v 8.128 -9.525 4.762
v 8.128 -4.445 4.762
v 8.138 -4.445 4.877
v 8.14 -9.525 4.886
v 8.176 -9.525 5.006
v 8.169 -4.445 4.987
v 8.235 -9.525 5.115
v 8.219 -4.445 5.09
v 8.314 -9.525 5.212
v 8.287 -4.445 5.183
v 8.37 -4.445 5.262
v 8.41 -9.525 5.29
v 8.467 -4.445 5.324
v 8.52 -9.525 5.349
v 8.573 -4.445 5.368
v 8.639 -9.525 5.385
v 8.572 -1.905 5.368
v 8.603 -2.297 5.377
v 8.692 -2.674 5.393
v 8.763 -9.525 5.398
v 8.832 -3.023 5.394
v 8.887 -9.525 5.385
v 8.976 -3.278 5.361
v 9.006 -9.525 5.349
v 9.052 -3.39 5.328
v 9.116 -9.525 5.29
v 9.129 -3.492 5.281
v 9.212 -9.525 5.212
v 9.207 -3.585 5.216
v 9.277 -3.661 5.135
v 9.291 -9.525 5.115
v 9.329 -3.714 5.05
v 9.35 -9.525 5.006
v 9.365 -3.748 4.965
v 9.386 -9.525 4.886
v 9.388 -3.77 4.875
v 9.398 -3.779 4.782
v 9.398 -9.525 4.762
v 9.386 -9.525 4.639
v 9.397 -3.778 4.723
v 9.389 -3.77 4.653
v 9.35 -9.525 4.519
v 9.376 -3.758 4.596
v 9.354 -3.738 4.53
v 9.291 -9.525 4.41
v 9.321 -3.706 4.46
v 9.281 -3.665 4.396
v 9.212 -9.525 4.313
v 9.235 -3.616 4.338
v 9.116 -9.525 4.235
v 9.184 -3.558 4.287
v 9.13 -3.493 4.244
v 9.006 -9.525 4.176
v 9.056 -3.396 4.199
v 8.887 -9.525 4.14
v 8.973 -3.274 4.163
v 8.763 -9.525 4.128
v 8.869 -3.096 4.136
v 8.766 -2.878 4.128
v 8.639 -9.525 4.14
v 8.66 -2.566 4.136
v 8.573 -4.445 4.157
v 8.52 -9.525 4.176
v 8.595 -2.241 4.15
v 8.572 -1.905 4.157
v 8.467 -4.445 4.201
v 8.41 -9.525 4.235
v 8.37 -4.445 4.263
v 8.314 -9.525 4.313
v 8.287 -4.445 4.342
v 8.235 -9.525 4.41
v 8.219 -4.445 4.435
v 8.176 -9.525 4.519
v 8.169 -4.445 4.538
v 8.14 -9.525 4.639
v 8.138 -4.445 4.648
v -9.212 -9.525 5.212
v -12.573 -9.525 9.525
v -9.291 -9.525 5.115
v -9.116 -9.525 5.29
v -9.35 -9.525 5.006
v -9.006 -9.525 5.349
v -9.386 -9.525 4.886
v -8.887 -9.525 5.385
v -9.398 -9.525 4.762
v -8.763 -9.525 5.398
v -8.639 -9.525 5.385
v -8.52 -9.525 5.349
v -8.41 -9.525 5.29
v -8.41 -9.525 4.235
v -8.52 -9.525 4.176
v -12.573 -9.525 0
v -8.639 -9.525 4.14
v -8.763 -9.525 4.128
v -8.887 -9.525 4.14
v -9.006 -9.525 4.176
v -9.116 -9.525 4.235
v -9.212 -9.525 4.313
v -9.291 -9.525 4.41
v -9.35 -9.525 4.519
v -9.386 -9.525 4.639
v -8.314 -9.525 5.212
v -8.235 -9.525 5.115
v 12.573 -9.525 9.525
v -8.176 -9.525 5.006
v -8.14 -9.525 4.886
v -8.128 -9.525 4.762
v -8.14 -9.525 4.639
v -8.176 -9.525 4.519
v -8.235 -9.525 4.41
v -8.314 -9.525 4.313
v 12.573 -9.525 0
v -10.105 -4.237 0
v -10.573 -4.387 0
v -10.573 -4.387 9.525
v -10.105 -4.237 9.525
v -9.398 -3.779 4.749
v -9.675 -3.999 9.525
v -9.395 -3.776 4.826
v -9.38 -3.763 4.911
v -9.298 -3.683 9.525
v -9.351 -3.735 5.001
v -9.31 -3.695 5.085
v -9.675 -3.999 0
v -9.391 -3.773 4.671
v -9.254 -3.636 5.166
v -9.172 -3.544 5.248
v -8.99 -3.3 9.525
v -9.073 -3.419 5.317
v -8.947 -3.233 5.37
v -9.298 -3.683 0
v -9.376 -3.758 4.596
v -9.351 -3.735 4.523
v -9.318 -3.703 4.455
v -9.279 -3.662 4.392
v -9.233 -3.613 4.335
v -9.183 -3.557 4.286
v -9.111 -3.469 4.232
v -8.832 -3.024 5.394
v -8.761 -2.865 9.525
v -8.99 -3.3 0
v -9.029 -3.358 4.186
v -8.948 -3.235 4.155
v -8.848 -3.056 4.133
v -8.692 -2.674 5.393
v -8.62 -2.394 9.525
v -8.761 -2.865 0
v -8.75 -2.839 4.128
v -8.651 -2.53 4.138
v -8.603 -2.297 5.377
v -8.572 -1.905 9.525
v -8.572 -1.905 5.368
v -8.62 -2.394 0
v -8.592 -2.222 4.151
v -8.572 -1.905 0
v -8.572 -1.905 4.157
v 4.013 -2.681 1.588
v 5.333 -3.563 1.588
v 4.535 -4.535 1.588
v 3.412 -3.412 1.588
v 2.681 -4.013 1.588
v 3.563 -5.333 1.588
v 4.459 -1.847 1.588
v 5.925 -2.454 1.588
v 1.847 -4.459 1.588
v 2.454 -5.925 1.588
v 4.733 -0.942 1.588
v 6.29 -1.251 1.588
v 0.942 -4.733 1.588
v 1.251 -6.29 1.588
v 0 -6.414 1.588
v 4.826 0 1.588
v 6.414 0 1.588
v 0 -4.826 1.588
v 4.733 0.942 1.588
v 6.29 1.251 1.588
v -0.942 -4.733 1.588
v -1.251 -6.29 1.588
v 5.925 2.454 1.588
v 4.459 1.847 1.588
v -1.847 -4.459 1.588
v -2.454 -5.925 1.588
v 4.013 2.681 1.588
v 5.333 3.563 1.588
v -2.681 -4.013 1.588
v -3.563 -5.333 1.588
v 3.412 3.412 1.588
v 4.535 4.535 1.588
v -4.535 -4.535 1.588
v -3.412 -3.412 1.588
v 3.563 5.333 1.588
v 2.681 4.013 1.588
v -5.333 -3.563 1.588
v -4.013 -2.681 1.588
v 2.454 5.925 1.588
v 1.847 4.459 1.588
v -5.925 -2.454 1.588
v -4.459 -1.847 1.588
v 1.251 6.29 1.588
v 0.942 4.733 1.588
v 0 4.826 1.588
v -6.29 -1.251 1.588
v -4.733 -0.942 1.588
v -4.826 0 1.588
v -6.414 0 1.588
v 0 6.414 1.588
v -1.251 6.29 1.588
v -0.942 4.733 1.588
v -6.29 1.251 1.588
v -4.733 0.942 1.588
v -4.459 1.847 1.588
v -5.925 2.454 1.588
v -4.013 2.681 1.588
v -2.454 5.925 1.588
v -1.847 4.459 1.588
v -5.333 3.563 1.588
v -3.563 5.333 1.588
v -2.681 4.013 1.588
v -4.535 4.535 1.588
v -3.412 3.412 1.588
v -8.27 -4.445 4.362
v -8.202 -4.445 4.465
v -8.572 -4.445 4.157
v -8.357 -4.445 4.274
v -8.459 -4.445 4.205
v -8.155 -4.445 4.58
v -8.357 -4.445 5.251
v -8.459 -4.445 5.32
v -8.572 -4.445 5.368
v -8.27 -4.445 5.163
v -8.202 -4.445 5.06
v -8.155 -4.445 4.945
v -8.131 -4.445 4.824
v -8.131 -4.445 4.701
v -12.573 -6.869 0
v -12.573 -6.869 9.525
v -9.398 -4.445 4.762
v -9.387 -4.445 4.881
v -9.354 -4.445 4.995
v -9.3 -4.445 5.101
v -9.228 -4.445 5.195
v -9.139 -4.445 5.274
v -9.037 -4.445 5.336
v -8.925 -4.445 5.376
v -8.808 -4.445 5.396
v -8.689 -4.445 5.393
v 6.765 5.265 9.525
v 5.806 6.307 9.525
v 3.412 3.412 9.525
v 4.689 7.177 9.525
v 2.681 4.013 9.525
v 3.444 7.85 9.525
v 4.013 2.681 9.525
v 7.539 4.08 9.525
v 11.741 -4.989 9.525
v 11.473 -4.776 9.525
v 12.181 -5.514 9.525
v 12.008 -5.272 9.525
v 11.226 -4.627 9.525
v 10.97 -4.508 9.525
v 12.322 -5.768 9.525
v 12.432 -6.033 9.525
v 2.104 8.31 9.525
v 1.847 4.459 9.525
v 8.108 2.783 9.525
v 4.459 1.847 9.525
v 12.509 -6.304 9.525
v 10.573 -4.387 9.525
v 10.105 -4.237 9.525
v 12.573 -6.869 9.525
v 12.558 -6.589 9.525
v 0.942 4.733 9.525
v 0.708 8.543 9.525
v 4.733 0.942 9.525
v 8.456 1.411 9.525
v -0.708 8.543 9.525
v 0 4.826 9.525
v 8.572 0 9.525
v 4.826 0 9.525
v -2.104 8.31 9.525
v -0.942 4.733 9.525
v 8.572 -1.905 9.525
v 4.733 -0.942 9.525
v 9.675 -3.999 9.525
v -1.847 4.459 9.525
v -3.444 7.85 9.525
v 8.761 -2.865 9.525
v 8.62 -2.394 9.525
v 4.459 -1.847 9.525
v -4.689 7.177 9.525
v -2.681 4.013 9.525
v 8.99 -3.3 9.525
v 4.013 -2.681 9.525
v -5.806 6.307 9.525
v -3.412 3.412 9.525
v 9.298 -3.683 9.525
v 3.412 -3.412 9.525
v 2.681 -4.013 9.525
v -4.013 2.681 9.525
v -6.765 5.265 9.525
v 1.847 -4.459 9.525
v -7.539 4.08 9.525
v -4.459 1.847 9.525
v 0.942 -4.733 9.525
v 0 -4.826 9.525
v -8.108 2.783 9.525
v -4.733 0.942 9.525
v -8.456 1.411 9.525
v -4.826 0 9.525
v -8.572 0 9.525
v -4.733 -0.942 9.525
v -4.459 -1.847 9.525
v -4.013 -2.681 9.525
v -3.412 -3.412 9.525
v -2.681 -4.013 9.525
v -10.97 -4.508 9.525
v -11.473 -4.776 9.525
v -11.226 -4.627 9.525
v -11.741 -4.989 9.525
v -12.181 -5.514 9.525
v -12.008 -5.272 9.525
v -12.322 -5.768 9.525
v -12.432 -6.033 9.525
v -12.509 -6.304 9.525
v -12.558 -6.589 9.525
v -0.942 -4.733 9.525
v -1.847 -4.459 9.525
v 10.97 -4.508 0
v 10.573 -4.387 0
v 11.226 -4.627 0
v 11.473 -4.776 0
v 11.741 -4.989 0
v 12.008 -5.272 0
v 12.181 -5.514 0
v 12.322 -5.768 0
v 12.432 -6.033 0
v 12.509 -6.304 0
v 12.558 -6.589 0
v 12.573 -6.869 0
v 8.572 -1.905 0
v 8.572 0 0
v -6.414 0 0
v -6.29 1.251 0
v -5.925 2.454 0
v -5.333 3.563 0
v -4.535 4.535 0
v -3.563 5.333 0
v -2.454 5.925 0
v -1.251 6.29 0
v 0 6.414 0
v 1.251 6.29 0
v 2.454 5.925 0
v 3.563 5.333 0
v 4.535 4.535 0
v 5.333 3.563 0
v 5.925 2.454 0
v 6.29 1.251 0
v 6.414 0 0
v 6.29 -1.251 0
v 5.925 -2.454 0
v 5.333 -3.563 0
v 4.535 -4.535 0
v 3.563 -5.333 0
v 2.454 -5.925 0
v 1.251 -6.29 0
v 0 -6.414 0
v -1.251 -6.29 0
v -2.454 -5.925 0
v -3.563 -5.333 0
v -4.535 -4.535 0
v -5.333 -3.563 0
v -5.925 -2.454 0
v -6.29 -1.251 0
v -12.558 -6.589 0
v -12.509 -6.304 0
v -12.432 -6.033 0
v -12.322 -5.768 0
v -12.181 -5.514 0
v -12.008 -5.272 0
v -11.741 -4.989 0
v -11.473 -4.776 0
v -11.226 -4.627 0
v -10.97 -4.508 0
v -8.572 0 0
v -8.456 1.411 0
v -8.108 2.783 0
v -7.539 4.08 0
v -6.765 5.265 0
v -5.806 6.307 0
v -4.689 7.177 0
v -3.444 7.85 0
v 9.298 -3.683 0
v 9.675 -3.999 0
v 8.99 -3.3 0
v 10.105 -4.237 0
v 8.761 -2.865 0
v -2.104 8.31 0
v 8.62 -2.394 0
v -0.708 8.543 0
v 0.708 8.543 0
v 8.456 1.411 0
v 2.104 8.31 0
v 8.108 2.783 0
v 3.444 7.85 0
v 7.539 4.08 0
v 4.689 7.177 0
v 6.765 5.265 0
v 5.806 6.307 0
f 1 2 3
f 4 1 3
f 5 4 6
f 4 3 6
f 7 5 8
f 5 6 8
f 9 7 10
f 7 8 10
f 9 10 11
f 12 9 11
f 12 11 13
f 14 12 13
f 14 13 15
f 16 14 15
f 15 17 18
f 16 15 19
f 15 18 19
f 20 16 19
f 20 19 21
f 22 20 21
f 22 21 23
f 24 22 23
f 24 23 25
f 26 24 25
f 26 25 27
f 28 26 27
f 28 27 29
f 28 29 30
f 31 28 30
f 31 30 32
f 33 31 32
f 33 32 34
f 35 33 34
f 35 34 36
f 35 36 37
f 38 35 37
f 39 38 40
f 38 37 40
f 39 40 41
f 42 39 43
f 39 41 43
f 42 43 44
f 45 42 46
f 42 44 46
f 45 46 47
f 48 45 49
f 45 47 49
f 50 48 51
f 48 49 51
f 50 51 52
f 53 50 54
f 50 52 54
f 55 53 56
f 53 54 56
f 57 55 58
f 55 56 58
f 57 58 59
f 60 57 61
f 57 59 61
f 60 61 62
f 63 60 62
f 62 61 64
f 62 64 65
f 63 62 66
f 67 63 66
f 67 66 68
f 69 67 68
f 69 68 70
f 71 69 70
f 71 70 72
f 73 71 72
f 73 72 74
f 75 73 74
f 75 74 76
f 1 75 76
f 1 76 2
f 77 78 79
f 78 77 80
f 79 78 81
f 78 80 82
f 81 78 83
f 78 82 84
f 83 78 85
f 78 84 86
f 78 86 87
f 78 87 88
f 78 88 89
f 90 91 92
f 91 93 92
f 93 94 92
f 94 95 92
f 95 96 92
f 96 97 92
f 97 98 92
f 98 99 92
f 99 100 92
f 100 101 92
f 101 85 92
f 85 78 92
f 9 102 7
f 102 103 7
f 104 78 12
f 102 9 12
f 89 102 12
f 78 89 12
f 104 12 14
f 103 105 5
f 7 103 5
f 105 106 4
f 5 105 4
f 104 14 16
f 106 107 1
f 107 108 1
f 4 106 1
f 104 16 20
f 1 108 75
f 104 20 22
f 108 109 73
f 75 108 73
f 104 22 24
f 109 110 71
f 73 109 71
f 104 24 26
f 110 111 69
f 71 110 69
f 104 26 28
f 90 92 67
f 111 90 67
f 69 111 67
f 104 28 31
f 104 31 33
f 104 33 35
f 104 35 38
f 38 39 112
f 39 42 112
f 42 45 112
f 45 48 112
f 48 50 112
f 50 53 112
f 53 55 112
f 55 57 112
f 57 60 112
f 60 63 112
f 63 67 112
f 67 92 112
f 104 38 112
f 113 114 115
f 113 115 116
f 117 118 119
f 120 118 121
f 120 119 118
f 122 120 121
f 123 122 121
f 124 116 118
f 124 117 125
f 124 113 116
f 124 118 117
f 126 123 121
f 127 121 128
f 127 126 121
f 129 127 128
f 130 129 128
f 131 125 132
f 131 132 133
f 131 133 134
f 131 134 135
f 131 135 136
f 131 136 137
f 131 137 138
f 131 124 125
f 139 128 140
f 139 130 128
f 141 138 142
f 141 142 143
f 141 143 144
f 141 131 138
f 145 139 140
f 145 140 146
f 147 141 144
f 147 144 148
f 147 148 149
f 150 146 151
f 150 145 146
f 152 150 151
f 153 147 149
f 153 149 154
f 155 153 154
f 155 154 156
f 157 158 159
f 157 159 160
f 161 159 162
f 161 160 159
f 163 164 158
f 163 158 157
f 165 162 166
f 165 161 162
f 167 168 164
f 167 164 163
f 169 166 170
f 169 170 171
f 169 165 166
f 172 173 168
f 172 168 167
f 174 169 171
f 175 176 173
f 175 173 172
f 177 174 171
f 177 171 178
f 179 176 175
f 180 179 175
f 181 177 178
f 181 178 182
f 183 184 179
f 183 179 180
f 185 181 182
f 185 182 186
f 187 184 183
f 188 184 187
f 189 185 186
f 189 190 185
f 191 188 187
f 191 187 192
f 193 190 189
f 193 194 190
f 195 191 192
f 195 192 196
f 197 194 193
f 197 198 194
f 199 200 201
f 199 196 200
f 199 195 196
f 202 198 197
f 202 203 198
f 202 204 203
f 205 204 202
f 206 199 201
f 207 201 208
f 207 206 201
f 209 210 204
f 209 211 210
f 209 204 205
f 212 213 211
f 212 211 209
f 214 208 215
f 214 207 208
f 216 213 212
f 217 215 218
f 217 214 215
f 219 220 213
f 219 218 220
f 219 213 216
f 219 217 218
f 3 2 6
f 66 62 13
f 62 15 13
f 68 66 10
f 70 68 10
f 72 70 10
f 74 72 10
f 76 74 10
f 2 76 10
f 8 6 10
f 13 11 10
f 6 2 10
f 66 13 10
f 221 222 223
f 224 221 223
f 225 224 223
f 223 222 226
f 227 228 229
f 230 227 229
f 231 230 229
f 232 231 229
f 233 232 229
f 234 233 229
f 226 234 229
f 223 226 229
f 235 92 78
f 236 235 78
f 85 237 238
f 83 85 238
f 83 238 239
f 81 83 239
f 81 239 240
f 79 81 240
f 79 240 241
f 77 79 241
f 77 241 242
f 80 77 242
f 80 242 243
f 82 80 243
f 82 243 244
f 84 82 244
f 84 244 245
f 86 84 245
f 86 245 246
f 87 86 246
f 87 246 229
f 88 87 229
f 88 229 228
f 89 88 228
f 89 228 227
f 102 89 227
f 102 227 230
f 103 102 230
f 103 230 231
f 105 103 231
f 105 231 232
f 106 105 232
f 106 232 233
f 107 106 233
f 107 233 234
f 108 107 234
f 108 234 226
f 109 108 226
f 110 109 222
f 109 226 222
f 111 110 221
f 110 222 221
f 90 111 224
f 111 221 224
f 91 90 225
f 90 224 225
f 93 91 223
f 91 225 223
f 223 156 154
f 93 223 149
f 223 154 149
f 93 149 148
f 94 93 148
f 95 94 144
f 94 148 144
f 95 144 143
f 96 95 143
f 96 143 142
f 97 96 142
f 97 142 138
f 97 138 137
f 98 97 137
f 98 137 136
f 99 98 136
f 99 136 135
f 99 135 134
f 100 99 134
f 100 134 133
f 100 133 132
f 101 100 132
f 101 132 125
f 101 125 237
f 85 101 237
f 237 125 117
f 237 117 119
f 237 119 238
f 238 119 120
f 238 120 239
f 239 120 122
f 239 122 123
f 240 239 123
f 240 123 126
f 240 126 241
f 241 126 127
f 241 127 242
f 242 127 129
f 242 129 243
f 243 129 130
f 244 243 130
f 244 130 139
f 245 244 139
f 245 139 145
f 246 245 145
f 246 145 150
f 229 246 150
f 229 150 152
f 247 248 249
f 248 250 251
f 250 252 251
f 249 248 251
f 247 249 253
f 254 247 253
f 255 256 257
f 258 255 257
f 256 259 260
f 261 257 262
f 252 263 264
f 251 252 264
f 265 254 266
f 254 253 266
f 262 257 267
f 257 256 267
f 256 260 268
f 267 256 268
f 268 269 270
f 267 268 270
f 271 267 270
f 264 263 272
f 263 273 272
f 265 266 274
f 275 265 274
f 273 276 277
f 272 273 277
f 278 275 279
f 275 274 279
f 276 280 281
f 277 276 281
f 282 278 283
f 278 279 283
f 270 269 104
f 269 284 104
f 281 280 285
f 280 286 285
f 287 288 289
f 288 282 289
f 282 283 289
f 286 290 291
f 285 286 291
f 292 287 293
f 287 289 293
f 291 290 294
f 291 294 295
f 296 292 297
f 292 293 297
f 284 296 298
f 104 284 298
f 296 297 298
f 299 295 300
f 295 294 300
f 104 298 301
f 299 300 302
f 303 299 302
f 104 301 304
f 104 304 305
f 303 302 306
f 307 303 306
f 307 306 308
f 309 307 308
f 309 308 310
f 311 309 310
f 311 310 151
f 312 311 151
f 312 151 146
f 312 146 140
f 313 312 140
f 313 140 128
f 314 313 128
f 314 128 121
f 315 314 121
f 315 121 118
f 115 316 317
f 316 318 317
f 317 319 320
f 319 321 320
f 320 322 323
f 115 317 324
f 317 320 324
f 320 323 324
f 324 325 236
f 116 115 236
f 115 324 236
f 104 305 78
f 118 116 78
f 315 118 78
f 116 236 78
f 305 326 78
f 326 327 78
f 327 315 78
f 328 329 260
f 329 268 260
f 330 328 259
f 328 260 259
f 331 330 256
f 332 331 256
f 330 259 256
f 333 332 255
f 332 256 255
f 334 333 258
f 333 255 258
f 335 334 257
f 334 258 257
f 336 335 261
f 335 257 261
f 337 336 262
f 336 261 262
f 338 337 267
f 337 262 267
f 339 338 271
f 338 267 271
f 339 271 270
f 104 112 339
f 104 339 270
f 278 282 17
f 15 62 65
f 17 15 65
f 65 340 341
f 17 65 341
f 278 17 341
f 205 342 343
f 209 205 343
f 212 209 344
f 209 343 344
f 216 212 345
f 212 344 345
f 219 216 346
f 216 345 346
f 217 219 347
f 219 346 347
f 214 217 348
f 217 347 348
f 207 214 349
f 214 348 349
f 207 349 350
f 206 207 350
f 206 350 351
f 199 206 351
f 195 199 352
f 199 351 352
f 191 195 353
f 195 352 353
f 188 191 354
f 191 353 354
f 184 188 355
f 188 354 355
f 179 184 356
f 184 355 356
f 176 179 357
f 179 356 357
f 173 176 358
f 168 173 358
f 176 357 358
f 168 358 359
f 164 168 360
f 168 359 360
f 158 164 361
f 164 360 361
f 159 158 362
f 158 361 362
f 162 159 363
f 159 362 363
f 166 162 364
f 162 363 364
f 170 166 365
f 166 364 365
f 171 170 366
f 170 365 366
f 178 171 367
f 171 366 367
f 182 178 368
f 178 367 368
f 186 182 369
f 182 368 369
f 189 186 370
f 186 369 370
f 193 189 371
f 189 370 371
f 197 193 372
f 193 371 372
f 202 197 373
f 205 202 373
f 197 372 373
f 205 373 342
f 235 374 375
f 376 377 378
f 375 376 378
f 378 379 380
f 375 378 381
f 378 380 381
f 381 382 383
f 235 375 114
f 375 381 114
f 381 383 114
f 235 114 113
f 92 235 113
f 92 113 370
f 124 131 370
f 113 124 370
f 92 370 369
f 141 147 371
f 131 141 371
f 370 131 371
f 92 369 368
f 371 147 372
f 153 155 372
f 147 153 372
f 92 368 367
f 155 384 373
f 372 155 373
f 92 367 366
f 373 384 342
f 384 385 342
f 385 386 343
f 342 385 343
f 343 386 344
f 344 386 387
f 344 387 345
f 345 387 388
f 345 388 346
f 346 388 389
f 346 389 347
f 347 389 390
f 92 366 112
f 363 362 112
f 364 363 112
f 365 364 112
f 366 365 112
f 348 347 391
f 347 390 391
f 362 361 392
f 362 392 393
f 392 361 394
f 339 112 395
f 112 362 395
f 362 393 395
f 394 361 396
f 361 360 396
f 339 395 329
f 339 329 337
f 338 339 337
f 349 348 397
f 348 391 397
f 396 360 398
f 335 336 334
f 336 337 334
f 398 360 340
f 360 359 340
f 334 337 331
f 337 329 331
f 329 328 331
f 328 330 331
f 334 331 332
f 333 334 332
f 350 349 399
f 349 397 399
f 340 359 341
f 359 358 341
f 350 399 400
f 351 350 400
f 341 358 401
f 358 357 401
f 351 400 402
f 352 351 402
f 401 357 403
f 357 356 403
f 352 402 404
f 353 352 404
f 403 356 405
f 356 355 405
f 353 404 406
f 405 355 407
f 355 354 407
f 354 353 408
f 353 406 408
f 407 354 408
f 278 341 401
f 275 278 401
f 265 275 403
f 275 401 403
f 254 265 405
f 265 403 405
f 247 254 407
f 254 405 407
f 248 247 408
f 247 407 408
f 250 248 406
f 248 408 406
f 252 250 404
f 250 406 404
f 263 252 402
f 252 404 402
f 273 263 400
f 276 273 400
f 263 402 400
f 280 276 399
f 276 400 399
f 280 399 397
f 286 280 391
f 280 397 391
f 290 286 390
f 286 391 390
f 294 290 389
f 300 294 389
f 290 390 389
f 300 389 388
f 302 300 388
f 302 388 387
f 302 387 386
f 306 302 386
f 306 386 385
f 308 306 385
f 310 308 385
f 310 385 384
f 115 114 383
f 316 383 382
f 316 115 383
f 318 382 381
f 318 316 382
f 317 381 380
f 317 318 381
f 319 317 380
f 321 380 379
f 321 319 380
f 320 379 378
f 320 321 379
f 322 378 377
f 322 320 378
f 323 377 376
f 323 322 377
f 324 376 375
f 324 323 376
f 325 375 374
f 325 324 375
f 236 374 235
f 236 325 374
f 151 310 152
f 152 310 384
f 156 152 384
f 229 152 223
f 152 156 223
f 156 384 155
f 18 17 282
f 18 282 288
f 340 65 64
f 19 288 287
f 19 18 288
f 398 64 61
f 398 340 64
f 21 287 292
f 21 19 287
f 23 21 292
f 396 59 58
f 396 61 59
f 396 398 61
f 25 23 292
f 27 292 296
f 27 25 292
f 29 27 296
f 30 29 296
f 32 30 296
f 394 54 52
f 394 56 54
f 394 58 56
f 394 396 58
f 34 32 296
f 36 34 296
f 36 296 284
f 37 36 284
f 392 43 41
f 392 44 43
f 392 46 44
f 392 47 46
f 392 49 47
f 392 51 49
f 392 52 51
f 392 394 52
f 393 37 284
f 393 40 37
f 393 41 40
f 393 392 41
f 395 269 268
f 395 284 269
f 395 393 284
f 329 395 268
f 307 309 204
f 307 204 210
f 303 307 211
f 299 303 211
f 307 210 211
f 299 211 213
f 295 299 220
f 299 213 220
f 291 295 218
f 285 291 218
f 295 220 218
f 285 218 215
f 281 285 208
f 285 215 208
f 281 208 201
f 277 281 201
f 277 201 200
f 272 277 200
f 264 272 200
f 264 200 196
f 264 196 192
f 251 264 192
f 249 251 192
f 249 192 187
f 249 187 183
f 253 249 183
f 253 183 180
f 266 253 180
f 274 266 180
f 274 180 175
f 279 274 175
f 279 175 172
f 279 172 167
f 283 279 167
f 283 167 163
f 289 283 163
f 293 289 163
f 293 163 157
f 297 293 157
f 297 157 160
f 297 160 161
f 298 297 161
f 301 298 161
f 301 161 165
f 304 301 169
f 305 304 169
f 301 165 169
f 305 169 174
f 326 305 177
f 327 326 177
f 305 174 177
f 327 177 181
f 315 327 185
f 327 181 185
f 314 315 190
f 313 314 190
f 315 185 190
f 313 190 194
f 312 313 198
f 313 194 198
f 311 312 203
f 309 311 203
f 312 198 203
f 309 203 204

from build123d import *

# Parameters (mm, degrees)
BOSS_EXTRUDE1_DEPTH = 9.525
SKETCH11_R          = 6.4135
CUT_EXTRUDE7_DEPTH  = 1.5875
SKETCH12_R          = 4.826
CUT_EXTRUDE8_DEPTH  = 23.464106648
SKETCH13_R          = 0.635
CUT_EXTRUDE9_DEPTH  = 25.720183808
FILLET1_R           = 2.54
SKETCH15_W          = 8.472670481
SKETCH15_H          = 13.323689659
SKETCH15_W_2        = 7.661730679
CUT_EXTRUDE10_DEPTH = 28.733584143
FILLET2_R           = 2.54


with BuildPart() as part:
    # Sketch10 → Boss-Extrude1 (new body)
    with BuildSketch(Plane.XY):
        with BuildLine():
            Line((-8.5725, 0), (-8.5725, -4.445))
            Line((-8.5725, -4.445), (-18.7325, -4.445))
            Line((-18.7325, -4.445), (-18.7325, -9.525))
            Line((-18.7325, -9.525), (18.7325, -9.525))
            Line((18.7325, -9.525), (18.7325, -4.445))
            Line((18.7325, -4.445), (8.5725, -4.445))
            Line((8.5725, -4.445), (8.5725, 0))
            ThreePointArc((8.5725, 0), (0, 8.5725), (-8.5725, 0))
        make_face()
    extrude(amount=BOSS_EXTRUDE1_DEPTH)

    # Sketch11 → Cut-Extrude7 (cut)
    with BuildSketch(Plane(origin=(0, 0, 0), x_dir=(-1, 0, 0), z_dir=(0, 0, -1))):
        Circle(SKETCH11_R)
    extrude(amount=-CUT_EXTRUDE7_DEPTH, mode=Mode.SUBTRACT)

    # Sketch12 → Cut-Extrude8 (cut, through all)
    with BuildSketch(Plane(origin=(0, 0, 1.5875), x_dir=(-1, 0, 0), z_dir=(0, 0, -1))):
        Circle(SKETCH12_R)
    extrude(amount=-CUT_EXTRUDE8_DEPTH, mode=Mode.SUBTRACT)

    # Sketch13 → Cut-Extrude9 (cut, through all)
    with BuildSketch(Plane(origin=(0, -4.445, 0), x_dir=(1, 0, 0), z_dir=(0, 1, 0))):
        with Locations(Location((-8.763, -4.7625, 0), (0, 0, 180))):
            Circle(SKETCH13_R)
        with Locations(Location((8.763, -4.7625, 0), (0, 0, 180))):
            Circle(SKETCH13_R)
    extrude(amount=-CUT_EXTRUDE9_DEPTH, mode=Mode.SUBTRACT)

    # Fillet1
    # the kernel refuses this fillet: 2.54 mm, written as the material it adds along each edge
    with BuildSketch(Plane(origin=(8.5725, -4.445, 0), x_dir=(0, 1, 0), z_dir=(0, 0, 1))) as fillet1_piece_1_section:
        with BuildLine():
            CenterArc((FILLET1_R, -FILLET1_R), FILLET1_R, 90, 90)
            Line((0, -FILLET1_R), (0, 0))
            Line((0, 0), (FILLET1_R, 0))
        make_face()
    fillet1_piece_1 = extrude(amount=10.506748607, mode=Mode.PRIVATE)
    fillet1_piece_1 = split(fillet1_piece_1, bisect_by=Plane(origin=(8.63691398, -2.568331275, 9.525), z_dir=(0, 0, -1)), keep=Keep.TOP, mode=Mode.PRIVATE)
    fillet1_piece_1 = fillet1_piece_1 - Plane(origin=(8.763, -2.568331275, 4.7625), x_dir=(-1, 0, 0), z_dir=(0, 1, 0)) * Cylinder(0.635, 32, mode=Mode.PRIVATE)
    add(fillet1_piece_1)
    with BuildSketch(Plane(origin=(-8.5725, -4.445, -0.981748607), x_dir=(0, 1, 0), z_dir=(0, 0, 1))) as fillet1_piece_2_section:
        with BuildLine():
            CenterArc((FILLET1_R, FILLET1_R), FILLET1_R, 180, 90)
            Line((0, FILLET1_R), (0, 0))
            Line((0, 0), (FILLET1_R, 0))
        make_face()
    fillet1_piece_2 = extrude(amount=10.506748607, mode=Mode.PRIVATE)
    fillet1_piece_2 = split(fillet1_piece_2, bisect_by=Plane(origin=(-8.636913982, -2.568331274, 0), z_dir=(0, 0, 1)), keep=Keep.TOP, mode=Mode.PRIVATE)
    fillet1_piece_2 = fillet1_piece_2 - Plane(origin=(-8.763, -2.568331274, 4.7625), x_dir=(-1, 0, 0), z_dir=(0, 1, 0)) * Cylinder(0.635, 32, mode=Mode.PRIVATE)
    add(fillet1_piece_2)
    # the kernel refuses this fillet: 2.54 mm, written as the material it takes off along each edge
    with BuildSketch(Plane(origin=(18.7325, -4.445, -6.35), x_dir=(-1, 0, 0), z_dir=(0, 0, 1)), Plane(origin=(-18.7325, -4.445, -6.35), x_dir=(0, -1, 0), z_dir=(0, 0, 1))) as fillet1_2_piece_1:
        with BuildLine():
            CenterArc((FILLET1_R, FILLET1_R), FILLET1_R, 180, 90)
            Line((0, FILLET1_R), (0, 0))
            Line((0, 0), (FILLET1_R, 0))
        make_face()
    extrude(amount=22.225, mode=Mode.SUBTRACT)

    # Sketch15 → Cut-Extrude10 (cut, through all)
    with BuildSketch(Plane.XZ.offset(9.525)):
        with Locations((-16.809335241, 4.995083112)):
            Rectangle(SKETCH15_W, SKETCH15_H)
        with Locations((16.40386534, 4.995083112)):
            Rectangle(SKETCH15_W_2, SKETCH15_H)
    extrude(amount=-CUT_EXTRUDE10_DEPTH, mode=Mode.SUBTRACT)

    # Fillet2
    fillet2_edges = [part.edges().sort_by_distance(p)[0] for p in [
        (12.573, -4.445, 4.7625),
        (-12.573, -4.445, 4.7625),
    ]]
    fillet(fillet2_edges, radius=FILLET2_R)


solid = part.part
